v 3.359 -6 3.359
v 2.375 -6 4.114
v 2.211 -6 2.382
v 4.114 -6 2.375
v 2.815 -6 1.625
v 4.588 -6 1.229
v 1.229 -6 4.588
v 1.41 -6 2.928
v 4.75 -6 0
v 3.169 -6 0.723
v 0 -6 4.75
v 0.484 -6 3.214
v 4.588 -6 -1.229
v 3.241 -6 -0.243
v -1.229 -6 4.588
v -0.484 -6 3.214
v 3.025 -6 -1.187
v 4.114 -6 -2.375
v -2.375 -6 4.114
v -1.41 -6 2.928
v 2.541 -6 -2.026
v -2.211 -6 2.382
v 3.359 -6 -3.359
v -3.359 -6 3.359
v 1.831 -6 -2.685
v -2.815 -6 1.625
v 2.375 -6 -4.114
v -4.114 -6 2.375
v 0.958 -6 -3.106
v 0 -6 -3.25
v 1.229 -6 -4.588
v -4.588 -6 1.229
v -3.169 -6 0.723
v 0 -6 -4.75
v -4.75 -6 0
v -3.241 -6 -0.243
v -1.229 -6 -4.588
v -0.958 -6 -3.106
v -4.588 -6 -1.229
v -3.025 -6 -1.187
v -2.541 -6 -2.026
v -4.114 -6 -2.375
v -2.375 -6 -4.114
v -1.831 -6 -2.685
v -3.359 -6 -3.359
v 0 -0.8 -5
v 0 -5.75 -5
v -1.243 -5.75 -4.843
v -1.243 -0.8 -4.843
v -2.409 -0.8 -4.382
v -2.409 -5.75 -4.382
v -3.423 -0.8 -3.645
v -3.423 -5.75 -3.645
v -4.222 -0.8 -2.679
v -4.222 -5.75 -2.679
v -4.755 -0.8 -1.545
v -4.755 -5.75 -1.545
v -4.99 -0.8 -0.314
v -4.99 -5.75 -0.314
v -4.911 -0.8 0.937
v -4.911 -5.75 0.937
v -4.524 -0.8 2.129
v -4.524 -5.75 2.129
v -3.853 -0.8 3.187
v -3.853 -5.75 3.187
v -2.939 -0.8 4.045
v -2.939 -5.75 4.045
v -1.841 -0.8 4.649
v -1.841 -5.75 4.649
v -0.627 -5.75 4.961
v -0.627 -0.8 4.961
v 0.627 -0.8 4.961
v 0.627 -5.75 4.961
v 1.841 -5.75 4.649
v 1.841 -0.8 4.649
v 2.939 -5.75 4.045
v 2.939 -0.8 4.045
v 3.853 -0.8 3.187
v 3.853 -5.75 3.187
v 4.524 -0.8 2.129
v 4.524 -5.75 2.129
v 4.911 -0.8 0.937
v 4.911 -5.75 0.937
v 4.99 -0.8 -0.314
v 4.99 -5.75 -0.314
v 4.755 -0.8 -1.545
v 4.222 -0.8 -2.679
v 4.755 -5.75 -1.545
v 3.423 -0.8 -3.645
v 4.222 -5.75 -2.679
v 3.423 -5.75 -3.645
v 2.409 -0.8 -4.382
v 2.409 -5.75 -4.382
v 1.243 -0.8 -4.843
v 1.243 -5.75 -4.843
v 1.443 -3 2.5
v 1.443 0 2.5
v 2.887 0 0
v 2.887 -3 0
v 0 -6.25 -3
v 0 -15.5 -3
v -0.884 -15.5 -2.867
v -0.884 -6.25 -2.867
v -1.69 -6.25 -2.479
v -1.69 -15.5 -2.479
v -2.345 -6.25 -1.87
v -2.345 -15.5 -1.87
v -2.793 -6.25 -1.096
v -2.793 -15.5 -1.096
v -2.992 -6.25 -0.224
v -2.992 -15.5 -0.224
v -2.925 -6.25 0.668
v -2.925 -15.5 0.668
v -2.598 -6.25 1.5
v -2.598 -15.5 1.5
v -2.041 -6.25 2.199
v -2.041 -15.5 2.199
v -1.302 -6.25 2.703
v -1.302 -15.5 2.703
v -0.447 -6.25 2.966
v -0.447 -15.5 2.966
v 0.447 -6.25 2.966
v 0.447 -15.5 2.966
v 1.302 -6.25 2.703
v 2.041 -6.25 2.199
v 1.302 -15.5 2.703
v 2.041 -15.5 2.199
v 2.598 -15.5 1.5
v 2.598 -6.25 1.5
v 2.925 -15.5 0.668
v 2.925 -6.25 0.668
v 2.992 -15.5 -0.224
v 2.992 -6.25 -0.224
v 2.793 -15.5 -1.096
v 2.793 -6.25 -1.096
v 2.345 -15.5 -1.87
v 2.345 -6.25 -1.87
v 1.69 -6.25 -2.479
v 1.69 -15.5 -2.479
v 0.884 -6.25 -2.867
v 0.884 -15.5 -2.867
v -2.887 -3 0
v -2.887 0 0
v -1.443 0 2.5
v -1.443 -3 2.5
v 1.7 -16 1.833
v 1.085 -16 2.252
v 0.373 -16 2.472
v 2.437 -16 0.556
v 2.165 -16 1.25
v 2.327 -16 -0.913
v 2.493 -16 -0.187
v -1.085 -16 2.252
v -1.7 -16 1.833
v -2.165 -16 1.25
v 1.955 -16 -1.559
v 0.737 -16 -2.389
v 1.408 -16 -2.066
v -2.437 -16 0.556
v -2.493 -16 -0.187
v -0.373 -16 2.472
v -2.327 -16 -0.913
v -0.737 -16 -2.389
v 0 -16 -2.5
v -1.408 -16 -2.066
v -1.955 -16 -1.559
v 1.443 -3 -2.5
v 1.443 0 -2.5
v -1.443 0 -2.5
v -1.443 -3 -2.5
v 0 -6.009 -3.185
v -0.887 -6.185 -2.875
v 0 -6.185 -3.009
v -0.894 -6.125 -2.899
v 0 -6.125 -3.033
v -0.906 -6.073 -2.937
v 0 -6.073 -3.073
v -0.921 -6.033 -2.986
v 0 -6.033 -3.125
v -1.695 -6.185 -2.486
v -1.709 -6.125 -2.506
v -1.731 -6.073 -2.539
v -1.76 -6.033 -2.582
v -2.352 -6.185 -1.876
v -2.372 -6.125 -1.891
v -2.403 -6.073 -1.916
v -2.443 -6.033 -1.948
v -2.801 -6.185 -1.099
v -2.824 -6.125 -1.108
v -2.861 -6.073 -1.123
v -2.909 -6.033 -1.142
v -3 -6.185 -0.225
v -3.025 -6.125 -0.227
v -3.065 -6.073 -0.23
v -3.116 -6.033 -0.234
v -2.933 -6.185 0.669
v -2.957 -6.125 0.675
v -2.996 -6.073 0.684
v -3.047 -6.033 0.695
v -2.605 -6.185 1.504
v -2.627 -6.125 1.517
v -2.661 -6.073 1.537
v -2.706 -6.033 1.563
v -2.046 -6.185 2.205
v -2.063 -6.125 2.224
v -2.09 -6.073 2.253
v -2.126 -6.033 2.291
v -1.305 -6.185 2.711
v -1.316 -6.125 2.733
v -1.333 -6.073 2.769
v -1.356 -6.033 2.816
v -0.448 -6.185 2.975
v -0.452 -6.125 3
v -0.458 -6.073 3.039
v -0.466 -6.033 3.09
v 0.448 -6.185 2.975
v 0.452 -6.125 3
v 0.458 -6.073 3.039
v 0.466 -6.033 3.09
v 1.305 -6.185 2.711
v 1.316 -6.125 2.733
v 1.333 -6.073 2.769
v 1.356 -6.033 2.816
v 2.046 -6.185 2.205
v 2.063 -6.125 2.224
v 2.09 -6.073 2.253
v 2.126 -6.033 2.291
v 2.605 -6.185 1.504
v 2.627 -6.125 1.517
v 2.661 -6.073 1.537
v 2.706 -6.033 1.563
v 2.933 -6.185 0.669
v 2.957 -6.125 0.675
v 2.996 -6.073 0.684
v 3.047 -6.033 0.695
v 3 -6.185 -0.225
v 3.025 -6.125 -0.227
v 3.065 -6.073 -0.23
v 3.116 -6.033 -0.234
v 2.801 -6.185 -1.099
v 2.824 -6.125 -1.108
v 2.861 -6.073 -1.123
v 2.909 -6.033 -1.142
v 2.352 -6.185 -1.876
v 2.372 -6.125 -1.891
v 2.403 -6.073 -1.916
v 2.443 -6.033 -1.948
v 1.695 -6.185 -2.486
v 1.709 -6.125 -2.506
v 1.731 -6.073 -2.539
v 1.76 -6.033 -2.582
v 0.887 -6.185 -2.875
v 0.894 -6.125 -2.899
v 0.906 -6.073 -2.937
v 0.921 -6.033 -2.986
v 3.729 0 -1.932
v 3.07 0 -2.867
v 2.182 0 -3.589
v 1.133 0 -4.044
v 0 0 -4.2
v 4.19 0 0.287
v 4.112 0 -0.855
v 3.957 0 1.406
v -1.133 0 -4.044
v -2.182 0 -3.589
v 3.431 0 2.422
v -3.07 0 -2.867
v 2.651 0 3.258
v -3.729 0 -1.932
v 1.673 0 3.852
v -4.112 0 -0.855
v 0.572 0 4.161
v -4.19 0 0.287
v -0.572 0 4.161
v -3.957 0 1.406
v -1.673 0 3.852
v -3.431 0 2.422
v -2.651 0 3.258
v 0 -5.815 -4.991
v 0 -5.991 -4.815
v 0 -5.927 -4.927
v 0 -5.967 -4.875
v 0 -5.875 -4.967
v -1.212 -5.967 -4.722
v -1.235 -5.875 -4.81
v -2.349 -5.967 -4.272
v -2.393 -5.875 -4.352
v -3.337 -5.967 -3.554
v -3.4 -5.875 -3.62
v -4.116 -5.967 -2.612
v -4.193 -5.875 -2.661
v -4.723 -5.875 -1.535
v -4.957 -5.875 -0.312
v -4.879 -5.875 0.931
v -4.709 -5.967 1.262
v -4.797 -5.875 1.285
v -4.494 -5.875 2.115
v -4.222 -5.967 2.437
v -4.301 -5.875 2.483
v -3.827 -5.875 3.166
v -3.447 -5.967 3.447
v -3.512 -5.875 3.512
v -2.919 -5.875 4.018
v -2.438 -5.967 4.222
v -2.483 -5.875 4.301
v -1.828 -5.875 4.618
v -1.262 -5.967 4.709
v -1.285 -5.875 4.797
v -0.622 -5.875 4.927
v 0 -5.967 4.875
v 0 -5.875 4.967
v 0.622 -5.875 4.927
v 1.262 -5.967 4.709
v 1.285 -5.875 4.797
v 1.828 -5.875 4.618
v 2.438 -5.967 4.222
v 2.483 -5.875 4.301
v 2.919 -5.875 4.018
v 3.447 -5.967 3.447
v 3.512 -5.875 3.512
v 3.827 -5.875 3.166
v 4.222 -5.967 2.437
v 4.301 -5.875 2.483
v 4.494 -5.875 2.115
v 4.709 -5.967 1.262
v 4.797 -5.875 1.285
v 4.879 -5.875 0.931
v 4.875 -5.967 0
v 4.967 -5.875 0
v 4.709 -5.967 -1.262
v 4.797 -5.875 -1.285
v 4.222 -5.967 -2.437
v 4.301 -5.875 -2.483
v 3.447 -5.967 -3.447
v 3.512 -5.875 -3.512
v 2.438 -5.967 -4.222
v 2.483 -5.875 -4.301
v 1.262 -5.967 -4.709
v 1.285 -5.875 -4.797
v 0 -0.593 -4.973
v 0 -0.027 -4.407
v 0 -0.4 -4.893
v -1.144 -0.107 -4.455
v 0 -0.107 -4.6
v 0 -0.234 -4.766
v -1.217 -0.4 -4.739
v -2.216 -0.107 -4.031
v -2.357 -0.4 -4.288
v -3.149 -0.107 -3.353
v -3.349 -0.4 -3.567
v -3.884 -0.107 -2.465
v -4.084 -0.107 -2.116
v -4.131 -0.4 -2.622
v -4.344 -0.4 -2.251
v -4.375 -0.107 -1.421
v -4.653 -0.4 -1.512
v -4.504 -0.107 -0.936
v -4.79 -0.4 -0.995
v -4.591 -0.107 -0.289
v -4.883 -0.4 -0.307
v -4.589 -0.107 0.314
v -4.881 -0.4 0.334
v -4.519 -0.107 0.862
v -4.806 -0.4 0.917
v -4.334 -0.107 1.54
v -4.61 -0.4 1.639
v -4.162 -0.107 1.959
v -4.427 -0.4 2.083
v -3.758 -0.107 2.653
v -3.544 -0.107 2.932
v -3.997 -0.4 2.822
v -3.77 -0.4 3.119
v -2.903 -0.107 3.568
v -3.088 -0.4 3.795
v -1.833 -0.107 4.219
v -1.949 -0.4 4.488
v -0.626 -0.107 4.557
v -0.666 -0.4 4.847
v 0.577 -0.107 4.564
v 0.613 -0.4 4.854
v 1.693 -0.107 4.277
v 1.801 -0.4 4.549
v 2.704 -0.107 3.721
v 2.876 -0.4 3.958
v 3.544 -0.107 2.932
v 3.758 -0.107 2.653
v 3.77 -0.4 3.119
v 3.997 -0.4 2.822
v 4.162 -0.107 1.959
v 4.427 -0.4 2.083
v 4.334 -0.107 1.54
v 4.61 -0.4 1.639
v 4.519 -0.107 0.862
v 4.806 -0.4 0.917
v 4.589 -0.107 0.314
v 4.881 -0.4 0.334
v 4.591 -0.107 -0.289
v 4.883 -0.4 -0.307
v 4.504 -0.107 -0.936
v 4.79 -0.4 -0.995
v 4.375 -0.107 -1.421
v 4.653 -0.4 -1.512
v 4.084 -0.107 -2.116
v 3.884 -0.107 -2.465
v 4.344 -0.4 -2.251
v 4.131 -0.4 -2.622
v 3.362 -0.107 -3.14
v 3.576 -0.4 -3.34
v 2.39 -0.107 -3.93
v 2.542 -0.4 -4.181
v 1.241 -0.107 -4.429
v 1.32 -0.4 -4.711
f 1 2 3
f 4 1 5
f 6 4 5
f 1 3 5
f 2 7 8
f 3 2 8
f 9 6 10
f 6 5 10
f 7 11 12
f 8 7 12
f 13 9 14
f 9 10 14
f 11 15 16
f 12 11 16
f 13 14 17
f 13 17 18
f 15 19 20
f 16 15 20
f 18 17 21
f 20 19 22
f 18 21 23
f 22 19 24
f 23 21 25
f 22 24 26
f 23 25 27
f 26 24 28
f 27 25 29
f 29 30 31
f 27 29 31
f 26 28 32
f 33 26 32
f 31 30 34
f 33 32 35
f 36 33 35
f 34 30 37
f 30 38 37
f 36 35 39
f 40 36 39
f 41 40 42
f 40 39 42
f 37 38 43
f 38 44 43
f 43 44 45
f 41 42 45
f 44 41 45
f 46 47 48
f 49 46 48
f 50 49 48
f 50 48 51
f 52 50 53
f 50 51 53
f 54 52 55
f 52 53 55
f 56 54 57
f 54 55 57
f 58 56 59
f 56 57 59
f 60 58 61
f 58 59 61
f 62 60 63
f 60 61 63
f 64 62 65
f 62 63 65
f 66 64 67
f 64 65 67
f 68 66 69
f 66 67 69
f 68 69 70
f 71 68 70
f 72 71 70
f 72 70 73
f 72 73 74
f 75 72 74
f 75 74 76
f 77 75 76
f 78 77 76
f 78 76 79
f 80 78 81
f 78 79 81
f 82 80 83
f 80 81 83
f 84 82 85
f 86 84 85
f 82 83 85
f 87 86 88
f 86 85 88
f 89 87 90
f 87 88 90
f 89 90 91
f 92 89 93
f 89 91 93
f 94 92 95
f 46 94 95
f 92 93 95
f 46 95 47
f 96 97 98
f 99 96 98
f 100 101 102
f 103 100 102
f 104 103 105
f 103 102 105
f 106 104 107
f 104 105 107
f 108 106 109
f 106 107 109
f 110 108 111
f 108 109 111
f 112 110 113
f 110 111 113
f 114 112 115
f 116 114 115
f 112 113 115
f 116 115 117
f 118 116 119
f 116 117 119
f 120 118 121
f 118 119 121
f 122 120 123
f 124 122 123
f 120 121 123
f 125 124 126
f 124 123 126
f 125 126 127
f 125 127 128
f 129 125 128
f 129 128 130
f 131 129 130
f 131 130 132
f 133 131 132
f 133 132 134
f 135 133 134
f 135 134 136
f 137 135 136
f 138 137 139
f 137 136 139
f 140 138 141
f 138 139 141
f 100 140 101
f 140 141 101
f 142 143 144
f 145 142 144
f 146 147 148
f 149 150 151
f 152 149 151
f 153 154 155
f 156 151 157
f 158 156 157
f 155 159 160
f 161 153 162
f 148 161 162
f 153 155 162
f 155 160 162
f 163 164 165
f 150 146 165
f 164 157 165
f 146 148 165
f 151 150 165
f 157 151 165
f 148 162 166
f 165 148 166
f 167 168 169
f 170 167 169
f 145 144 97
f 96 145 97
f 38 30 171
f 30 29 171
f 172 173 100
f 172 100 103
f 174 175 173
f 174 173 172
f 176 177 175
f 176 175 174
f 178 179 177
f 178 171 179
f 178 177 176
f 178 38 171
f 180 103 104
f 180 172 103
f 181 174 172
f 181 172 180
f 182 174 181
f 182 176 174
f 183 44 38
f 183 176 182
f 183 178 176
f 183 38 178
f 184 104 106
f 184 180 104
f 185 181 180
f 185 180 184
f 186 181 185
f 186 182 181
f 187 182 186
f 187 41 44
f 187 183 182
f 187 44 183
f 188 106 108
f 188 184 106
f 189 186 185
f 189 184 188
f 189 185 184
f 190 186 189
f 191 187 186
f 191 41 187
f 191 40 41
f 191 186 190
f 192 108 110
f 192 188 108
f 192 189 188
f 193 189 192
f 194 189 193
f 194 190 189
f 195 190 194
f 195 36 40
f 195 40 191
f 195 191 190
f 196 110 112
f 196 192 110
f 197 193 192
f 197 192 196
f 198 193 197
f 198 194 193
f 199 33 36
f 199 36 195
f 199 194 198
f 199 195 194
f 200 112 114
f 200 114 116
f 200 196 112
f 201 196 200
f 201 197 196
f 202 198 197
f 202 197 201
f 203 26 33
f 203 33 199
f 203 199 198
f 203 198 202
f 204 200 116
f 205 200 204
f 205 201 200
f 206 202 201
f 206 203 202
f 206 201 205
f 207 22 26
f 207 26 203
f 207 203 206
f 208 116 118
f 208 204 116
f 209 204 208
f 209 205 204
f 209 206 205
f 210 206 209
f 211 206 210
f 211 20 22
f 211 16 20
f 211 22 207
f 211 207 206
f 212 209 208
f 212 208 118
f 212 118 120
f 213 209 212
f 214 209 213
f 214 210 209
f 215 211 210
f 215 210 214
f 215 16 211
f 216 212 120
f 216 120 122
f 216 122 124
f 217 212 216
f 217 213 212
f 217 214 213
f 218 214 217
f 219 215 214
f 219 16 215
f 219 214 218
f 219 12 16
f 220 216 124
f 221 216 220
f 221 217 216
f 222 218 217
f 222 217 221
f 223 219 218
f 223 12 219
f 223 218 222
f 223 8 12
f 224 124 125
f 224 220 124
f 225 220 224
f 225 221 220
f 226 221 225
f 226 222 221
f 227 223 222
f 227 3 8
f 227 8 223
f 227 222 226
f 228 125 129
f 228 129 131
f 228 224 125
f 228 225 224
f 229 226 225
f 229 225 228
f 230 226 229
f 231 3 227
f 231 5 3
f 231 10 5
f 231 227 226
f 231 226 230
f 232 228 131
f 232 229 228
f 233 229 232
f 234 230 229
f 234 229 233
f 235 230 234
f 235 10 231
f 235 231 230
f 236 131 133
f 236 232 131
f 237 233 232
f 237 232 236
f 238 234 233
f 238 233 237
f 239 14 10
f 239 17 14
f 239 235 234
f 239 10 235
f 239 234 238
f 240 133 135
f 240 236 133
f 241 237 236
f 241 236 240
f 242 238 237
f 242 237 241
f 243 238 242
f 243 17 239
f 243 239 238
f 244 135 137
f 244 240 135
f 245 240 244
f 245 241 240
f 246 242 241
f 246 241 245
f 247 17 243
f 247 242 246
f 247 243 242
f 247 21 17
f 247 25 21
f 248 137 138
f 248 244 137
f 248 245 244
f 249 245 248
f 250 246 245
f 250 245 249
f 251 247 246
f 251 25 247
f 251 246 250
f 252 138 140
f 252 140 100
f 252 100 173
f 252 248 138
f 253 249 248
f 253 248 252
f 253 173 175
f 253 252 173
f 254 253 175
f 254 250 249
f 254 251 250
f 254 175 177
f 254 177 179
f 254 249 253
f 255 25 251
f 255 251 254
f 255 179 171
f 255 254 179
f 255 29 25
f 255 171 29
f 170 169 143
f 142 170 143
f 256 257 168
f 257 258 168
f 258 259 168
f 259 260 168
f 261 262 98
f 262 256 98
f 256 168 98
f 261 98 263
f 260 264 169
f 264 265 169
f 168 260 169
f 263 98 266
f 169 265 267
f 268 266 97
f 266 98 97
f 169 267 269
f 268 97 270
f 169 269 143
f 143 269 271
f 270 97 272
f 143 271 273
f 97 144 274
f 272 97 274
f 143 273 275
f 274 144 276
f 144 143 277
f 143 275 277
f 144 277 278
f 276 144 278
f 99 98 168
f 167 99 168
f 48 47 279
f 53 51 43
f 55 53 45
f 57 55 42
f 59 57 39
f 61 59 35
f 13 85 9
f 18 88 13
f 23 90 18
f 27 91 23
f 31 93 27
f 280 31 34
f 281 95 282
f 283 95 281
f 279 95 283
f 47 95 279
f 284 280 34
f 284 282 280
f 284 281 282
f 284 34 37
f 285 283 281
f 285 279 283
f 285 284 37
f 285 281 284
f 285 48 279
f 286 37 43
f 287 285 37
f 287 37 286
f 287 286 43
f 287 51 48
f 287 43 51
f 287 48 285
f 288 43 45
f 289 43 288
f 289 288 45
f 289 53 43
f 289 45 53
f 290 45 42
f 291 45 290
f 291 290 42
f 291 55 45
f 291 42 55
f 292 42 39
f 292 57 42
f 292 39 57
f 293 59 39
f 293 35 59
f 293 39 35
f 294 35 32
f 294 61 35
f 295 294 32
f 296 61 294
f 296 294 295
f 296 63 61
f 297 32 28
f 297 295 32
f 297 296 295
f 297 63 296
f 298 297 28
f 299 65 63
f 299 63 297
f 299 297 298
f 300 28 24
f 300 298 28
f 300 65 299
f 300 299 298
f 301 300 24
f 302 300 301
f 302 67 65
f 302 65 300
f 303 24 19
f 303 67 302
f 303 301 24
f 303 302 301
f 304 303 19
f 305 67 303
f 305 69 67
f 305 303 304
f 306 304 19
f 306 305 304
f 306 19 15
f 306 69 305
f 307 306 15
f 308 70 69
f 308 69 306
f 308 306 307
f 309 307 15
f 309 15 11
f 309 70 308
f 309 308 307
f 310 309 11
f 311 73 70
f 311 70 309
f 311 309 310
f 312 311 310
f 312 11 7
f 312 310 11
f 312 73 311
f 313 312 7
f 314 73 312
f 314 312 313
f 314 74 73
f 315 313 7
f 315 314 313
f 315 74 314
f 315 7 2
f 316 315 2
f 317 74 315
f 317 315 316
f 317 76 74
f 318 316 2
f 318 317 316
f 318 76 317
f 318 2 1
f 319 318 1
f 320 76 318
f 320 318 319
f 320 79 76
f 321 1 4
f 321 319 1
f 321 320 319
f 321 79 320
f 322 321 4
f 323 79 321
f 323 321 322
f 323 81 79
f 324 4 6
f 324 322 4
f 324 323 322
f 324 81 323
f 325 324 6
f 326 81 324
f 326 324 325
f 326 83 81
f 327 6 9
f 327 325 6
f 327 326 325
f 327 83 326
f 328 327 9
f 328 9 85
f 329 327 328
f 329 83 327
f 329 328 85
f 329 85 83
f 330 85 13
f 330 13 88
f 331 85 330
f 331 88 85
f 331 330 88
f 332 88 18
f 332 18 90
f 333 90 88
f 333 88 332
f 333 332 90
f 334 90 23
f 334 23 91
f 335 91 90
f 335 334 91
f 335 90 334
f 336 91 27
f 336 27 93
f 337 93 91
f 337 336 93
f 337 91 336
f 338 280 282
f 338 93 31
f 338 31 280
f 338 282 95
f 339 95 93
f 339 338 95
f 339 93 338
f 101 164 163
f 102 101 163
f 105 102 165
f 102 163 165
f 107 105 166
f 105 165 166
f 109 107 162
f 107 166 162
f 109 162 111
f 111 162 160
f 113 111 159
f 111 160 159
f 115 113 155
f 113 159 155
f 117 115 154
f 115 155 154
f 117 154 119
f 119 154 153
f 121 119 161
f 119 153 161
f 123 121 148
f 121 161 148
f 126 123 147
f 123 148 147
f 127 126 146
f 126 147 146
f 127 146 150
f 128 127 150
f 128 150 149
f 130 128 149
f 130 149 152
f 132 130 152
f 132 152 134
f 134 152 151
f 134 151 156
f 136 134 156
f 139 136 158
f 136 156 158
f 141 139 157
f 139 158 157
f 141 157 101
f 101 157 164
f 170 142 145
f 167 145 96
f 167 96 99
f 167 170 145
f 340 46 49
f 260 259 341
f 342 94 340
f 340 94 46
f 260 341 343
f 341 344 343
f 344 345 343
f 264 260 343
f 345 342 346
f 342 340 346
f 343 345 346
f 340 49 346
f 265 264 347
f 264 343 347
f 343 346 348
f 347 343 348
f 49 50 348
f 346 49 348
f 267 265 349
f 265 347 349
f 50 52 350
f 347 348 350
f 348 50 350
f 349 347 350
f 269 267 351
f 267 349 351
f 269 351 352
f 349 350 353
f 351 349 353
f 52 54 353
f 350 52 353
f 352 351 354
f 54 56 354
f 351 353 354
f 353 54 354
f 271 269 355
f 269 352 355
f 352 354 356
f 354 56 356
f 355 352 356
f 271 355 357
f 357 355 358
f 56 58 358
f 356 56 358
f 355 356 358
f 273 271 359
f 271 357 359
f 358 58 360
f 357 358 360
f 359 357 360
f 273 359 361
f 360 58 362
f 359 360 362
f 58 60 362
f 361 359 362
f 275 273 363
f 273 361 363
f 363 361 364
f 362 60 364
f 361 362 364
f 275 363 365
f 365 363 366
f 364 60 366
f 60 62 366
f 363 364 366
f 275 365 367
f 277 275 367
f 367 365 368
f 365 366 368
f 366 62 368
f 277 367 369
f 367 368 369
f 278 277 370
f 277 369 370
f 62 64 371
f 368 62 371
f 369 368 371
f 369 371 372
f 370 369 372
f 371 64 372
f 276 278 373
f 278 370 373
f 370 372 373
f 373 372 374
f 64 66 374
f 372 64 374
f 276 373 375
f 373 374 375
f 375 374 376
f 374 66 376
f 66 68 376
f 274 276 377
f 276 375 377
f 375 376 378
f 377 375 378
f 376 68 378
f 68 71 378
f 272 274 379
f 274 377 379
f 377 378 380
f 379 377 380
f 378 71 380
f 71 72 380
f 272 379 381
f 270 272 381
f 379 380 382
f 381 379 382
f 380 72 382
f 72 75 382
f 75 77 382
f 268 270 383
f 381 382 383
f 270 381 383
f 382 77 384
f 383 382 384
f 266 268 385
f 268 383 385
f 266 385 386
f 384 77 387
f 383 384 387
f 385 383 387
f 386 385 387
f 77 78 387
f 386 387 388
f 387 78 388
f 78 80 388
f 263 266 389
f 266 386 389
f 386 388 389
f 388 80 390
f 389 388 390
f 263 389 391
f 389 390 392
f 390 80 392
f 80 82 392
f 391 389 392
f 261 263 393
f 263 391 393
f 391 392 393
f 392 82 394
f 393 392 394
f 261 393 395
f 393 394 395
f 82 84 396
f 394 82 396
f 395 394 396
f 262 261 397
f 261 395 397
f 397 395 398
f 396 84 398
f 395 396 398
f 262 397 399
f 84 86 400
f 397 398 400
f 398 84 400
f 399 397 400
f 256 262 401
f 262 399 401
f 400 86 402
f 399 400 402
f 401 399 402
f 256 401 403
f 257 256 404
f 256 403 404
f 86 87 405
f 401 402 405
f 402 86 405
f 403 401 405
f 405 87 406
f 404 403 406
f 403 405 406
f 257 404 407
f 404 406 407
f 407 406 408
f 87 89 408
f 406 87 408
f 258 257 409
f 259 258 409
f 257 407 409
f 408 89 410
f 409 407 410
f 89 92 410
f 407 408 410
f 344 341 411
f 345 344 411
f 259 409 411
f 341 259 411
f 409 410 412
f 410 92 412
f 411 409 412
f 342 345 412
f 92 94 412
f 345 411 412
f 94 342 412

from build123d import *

# Parameters (mm, degrees)
CUT_EXTRUDE1_DEPTH = 3
FILLET3_R          = 0.8
CHAMFER1_SIZE      = 0.5
FILLET4_R          = 0.25


with BuildPart() as part:
    # Sketch1 → Revolve1 (revolve)
    with BuildSketch(Plane.XY, mode=Mode.PRIVATE) as revolve1_sk:
        Polygon((0, 0), (5, 0), (5, -6), (3, -6), (3, -16), (0, -16), align=None)
    revolve(revolve1_sk.sketch.rotate(Axis((0, -21, 0), (0, 1, 0)), 90), axis=Axis((0, -21, 0), (0, 1, 0)))

    # Sketch2 → Cut-Extrude1 (cut)
    with BuildSketch(Plane(origin=(0, 0, 0), x_dir=(1, 0, 0), z_dir=(0, 1, 0))):
        Polygon((2.886751346, 0), (1.443375673, 2.5), (-1.443375673, 2.5), (-2.886751346, 0), (-1.443375673, -2.5), (1.443375673, -2.5), align=None)
    extrude(amount=-CUT_EXTRUDE1_DEPTH, mode=Mode.SUBTRACT)

    # Fillet3
    fillet3_edges = [part.edges().sort_by_distance(p)[0] for p in [
        (0, 0, 5),
    ]]
    fillet(fillet3_edges, radius=FILLET3_R)

    # Chamfer1
    chamfer1_edges = [part.edges().sort_by_distance(p)[0] for p in [
        (0, -16, 3),
    ]]
    chamfer(chamfer1_edges, length=CHAMFER1_SIZE)

    # Fillet4
    fillet4_edges = [part.edges().sort_by_distance(p)[0] for p in [
        (0, -6, 3),
        (0, -6, 5),
    ]]
    fillet(fillet4_edges, radius=FILLET4_R)


solid = part.part
